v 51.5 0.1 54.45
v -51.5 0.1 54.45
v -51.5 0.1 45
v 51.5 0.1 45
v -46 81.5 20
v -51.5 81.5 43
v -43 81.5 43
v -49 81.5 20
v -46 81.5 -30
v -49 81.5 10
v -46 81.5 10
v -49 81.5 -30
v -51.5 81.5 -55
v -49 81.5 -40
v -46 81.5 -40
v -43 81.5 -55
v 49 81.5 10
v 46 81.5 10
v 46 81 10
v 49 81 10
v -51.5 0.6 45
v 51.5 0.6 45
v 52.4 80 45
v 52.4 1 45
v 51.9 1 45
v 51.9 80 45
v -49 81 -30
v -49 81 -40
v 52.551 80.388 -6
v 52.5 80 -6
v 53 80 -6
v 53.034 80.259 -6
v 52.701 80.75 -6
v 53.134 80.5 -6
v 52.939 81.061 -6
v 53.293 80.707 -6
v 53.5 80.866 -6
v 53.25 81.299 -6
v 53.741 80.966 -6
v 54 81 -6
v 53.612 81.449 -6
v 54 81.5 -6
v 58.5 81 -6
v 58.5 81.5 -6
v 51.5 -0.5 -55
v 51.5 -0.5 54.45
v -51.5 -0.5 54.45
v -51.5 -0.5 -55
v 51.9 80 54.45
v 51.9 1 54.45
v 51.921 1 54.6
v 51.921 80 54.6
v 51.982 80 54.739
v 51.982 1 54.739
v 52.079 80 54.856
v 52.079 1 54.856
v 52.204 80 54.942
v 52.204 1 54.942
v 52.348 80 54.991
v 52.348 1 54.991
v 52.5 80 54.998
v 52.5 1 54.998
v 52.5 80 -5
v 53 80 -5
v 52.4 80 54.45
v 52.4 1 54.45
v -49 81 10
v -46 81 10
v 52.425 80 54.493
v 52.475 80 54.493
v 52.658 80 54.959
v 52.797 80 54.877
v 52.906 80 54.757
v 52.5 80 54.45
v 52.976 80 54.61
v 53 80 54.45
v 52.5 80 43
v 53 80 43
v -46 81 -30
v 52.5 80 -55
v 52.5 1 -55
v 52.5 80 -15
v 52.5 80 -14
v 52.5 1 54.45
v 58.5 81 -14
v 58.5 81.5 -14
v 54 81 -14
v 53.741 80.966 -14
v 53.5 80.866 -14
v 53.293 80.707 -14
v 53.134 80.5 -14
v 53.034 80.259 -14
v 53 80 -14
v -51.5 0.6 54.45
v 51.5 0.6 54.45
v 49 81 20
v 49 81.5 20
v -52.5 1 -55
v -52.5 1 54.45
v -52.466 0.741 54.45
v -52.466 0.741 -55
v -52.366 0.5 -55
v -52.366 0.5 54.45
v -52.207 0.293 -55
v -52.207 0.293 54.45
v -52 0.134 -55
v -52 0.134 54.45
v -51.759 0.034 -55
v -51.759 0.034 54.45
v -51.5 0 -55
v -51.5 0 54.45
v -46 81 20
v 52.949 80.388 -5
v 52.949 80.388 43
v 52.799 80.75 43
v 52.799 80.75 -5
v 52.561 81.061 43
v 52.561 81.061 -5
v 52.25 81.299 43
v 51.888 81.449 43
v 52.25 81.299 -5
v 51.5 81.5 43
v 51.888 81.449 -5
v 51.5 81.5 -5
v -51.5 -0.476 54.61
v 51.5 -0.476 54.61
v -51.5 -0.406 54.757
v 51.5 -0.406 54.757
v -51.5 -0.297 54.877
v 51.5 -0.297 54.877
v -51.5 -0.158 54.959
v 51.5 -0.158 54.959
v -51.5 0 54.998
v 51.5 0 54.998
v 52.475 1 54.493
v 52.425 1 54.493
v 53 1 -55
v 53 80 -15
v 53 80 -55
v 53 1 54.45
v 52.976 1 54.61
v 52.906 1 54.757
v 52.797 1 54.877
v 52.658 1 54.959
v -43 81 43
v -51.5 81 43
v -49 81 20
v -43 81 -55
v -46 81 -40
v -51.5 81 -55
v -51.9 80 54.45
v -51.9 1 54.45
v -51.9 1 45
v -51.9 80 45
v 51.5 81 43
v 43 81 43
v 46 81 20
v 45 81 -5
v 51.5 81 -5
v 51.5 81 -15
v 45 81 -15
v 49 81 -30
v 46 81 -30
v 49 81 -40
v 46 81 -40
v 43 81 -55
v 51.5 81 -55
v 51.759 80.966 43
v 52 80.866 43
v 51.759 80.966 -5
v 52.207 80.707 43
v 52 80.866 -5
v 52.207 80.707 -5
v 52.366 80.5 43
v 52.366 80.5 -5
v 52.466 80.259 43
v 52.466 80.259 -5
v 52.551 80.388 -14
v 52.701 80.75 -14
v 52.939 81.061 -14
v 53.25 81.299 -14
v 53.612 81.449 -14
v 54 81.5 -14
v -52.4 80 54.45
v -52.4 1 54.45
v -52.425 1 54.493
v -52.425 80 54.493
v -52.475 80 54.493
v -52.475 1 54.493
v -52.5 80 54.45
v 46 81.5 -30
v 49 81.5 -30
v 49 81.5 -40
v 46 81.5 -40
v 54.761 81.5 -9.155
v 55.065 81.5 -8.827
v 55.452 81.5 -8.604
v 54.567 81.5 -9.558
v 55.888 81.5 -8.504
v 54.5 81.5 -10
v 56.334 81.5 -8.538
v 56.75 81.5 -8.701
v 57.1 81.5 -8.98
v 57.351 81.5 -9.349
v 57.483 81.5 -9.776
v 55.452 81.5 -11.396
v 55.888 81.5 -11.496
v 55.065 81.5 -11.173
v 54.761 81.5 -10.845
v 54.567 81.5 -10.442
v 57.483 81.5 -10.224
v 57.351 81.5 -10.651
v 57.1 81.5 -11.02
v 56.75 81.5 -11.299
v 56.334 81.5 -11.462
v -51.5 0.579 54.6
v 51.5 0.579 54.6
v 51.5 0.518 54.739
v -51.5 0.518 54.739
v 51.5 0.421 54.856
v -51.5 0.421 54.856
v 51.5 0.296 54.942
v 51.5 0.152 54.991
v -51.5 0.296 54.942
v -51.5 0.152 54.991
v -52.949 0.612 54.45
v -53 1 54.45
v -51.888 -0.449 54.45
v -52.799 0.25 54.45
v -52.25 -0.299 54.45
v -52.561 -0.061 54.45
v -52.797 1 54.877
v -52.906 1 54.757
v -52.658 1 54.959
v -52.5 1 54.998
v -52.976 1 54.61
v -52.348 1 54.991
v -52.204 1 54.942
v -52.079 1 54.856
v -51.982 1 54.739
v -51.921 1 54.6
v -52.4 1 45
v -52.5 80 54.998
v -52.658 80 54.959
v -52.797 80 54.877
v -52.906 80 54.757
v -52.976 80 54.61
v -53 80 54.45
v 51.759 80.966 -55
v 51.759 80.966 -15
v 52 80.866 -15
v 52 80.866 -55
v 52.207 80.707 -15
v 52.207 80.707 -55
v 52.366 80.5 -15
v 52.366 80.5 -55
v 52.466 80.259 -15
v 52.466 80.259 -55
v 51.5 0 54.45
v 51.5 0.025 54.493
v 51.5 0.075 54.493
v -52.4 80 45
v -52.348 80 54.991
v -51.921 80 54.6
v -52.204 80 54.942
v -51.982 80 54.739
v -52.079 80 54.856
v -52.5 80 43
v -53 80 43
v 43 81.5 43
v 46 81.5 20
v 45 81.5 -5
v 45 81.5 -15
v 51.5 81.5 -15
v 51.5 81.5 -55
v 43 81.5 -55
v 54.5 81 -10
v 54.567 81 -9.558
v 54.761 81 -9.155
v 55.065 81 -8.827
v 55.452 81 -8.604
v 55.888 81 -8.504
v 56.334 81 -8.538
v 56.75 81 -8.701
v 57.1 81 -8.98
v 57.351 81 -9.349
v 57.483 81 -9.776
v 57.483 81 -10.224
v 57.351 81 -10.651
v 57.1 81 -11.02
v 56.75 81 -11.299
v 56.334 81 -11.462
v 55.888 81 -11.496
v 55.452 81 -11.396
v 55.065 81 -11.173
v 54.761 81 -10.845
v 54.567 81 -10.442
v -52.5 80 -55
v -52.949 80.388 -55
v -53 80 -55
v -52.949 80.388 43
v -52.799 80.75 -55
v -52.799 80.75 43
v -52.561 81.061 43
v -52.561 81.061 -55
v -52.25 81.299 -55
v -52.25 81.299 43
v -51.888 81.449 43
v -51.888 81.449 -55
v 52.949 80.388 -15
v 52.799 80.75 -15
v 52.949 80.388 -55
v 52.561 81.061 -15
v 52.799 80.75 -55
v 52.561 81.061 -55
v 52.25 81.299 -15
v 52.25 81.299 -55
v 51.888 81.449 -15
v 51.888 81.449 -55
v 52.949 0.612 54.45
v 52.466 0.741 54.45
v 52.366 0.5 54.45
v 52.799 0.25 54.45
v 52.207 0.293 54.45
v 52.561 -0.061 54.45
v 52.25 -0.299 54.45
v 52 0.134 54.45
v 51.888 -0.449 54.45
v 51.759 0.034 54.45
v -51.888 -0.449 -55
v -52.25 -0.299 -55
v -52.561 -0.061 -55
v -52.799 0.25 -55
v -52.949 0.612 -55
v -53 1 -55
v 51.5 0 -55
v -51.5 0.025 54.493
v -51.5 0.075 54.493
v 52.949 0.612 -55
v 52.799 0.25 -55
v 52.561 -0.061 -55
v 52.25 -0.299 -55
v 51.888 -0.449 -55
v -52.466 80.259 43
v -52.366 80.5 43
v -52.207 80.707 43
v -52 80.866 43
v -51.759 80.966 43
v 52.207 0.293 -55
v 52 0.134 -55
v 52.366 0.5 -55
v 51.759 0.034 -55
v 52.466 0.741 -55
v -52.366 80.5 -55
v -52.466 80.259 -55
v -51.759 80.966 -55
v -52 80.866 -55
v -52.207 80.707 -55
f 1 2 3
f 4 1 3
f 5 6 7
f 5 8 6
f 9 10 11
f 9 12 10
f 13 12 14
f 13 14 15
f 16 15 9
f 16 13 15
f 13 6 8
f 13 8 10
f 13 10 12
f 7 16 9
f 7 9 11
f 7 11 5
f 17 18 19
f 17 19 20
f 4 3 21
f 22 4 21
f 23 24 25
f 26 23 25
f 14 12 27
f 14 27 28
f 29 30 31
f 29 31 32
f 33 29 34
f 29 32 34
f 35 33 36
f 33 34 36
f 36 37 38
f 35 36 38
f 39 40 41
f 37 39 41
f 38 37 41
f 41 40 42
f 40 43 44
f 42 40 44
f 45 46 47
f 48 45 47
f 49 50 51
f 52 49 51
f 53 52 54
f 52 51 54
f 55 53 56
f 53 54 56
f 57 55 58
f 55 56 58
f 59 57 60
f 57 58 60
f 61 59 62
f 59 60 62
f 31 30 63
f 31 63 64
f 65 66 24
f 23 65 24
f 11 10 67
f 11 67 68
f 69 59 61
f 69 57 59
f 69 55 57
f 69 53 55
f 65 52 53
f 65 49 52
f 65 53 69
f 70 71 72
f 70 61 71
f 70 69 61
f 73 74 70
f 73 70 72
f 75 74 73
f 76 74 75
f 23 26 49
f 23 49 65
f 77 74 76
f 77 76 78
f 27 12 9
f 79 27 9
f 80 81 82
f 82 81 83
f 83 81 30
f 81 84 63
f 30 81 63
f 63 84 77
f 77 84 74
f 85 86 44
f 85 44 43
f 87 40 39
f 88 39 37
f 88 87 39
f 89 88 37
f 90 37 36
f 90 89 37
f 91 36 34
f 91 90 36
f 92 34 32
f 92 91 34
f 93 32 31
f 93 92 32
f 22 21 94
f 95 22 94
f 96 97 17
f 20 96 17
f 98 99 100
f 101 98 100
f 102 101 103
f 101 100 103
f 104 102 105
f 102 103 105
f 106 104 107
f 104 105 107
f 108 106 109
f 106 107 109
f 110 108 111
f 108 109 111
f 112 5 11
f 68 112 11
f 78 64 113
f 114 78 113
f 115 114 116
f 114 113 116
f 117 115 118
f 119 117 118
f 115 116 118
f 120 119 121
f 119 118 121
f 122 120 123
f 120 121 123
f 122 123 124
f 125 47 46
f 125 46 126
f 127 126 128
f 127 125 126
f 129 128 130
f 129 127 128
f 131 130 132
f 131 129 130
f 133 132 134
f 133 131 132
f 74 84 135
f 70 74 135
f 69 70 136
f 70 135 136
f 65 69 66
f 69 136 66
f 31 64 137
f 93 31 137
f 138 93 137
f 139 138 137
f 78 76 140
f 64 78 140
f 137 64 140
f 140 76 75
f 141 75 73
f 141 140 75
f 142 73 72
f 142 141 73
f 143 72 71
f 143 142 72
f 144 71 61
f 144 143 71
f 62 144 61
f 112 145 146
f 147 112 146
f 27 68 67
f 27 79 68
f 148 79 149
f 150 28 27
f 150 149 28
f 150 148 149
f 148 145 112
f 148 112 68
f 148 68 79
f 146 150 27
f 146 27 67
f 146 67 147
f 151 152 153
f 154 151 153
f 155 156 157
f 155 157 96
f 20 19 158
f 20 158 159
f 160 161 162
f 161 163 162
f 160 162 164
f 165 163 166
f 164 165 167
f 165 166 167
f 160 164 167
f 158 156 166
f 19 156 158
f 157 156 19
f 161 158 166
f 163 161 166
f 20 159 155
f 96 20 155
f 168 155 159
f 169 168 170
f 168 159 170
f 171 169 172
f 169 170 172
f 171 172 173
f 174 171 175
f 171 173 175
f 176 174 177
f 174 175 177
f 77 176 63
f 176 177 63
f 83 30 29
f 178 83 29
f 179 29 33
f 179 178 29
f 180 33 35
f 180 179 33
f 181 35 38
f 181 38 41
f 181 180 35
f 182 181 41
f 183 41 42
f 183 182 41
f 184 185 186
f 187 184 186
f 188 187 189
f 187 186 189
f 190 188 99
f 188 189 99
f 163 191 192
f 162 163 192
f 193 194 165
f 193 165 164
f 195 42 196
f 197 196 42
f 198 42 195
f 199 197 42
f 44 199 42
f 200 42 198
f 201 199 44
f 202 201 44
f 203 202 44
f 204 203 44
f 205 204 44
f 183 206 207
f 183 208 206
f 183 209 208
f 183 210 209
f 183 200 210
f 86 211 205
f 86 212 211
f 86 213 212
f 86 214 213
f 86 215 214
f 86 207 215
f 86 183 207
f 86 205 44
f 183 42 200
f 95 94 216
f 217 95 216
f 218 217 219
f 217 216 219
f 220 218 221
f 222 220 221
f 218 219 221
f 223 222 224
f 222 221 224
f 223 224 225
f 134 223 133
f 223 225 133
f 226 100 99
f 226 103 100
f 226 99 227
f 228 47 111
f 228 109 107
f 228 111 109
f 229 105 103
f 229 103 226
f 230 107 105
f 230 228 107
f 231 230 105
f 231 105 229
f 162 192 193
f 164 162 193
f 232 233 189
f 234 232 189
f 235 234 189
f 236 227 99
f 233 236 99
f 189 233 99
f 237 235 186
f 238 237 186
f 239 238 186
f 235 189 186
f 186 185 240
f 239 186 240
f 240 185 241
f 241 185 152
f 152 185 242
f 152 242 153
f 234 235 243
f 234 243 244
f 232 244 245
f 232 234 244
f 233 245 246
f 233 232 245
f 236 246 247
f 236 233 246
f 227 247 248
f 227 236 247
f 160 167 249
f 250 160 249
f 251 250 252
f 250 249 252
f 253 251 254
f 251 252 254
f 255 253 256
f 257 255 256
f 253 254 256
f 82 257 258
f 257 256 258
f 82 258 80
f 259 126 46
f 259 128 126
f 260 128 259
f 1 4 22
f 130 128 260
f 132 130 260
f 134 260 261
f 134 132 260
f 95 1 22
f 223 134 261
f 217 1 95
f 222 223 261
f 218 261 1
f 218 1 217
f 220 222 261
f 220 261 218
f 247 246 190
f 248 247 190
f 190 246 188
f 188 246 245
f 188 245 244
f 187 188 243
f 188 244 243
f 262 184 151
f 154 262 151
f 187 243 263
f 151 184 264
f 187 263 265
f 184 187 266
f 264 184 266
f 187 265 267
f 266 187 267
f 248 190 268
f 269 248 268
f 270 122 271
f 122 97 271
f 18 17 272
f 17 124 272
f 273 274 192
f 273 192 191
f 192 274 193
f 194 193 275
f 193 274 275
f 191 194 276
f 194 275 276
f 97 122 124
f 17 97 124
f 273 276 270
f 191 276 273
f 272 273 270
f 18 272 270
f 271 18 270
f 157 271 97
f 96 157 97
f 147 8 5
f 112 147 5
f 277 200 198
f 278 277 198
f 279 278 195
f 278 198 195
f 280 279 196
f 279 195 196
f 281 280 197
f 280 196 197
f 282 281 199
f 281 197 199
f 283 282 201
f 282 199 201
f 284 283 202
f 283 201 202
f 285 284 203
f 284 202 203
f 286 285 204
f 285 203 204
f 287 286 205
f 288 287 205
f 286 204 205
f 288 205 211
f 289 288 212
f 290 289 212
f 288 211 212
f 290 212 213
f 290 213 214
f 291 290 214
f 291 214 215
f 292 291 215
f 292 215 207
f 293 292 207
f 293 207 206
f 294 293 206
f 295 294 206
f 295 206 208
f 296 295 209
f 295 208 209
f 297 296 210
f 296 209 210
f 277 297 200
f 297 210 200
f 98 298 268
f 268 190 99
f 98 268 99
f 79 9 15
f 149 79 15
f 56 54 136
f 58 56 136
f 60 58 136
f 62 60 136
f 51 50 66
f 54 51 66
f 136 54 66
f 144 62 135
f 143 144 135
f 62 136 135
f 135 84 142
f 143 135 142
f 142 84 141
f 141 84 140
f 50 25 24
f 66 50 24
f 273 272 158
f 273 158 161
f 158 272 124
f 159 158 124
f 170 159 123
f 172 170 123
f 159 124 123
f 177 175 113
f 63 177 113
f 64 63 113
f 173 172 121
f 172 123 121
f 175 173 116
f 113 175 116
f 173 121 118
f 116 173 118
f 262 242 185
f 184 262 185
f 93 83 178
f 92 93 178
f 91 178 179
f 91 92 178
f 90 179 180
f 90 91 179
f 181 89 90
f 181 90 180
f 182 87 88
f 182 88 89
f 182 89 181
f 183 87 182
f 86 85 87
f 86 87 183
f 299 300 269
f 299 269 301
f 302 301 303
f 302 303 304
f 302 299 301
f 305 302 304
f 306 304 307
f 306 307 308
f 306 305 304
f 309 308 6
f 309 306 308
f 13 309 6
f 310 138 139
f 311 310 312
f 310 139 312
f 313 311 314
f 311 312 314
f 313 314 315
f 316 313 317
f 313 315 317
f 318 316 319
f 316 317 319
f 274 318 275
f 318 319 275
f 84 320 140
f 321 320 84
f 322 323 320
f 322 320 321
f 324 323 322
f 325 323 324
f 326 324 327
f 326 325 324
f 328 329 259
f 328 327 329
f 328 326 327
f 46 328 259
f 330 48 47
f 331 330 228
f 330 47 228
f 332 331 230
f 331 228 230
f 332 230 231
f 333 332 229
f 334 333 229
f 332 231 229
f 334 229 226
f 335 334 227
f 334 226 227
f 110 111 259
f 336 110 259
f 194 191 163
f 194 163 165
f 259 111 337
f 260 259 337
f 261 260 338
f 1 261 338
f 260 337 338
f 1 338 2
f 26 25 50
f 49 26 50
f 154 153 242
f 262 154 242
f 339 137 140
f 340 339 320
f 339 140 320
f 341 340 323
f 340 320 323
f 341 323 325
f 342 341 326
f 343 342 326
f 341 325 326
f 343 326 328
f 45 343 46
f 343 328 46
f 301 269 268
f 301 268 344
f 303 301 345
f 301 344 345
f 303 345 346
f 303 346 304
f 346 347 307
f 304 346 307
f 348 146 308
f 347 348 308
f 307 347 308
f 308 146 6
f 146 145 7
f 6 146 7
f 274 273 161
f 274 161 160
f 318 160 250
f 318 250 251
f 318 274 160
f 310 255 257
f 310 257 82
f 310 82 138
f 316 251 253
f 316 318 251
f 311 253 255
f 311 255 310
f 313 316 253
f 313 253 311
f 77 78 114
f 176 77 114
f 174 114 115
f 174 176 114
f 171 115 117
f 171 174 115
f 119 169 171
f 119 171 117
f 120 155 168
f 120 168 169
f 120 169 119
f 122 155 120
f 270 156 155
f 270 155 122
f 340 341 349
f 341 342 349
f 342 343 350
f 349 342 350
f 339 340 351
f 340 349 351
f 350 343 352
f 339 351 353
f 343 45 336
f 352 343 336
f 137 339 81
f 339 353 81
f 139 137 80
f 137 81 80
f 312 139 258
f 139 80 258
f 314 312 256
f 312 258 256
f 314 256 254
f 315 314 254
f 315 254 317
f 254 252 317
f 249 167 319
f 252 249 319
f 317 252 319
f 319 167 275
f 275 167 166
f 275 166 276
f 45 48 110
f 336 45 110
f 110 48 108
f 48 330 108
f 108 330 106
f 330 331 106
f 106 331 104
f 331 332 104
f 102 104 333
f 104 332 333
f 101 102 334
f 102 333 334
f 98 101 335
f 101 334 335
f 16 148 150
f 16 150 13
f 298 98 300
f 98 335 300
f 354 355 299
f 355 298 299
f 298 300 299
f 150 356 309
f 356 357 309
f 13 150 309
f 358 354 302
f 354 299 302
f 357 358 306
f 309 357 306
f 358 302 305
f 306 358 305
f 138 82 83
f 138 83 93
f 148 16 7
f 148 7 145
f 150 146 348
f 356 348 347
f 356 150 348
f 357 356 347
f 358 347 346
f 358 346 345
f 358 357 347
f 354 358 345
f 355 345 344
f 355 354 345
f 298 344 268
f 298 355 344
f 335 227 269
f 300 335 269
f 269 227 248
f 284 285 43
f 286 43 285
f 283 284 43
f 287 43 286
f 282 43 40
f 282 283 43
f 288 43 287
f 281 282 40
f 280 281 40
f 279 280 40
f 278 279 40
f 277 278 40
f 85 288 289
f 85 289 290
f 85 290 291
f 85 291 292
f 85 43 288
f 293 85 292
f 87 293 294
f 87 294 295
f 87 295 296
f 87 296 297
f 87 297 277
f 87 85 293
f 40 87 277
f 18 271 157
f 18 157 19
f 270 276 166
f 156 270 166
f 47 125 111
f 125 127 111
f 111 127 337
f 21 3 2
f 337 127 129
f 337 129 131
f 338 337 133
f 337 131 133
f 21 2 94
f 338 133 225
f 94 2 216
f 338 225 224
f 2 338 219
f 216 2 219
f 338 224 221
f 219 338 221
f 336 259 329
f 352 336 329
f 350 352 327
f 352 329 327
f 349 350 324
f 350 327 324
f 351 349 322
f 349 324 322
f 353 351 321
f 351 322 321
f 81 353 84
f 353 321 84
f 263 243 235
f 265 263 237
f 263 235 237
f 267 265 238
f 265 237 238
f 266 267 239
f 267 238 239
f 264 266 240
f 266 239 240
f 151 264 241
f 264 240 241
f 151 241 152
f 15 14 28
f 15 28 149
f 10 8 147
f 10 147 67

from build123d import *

# Parameters (mm, degrees)
SM_BASE_FLANGE_1_DEPTH = 55
OTHER_START            = -1
OTHER_1_DEPTH          = 2
OTHER_START_2          = 1
OTHER_1_2_DEPTH        = 79
OTHER_START_3          = -0.24719
OTHER_1_3_DEPTH        = 81.24719
OTHER_START_4          = -51.5
OTHER_1_4_DEPTH        = 103
OTHER_1_5_DEPTH        = 103
SM_EDGE_FLANGE_1_DEPTH = 98
SKETCH_19_W            = 10
SKETCH_19_H            = 10
CUT_EXTRUDE_1_DEPTH    = 1.5
SM_EDGE_FLANGE_2_DEPTH = 8
SKETCH_24_R            = 1.5
CUT_EXTRUDE_2_DEPTH    = 0.5
SKETCH_27_W            = 3
SKETCH_27_H            = 10
CUT_EXTRUDE_3_DEPTH    = 0.5


with BuildPart() as part:
    # 基体-法兰1: sheet metal written as solids
    # Sketch 1 → 基体-法兰1 (new, symmetric)
    with BuildSketch(Plane.XY):
        with BuildLine():
            Line((-52.5, 80), (-52.5, 1))
            ThreePointArc((-52.5, 1), (-52.207106781, 0.292893219), (-51.5, 0))
            Line((-51.5, 0), (51.5, 0))
            ThreePointArc((51.5, 0), (52.207106781, 0.292893219), (52.5, 1))
            Line((52.5, 1), (52.5, 80))
            Line((52.5, 80), (53, 80))
            Line((53, 80), (53, 1))
            ThreePointArc((53, 1), (52.560660172, -0.060660172), (51.5, -0.5))
            Line((51.5, -0.5), (-51.5, -0.5))
            ThreePointArc((-51.5, -0.5), (-52.560660172, -0.060660172), (-53, 1))
            Line((-53, 1), (-53, 80))
            Line((-53, 80), (-52.5, 80))
        make_face()
    extrude(amount=SM_BASE_FLANGE_1_DEPTH, both=True)

    # Other 1: read off the stored shape, not the designer's step
    # Other 1 outline → Other 1 (cut)
    with BuildSketch(Plane(origin=(0, 0, 0), x_dir=(1, 0, 0), z_dir=(0, 1, 0)).offset(OTHER_START)):
        with BuildLine():
            Line((51.5, -54.45), (51.5, -55))
            Line((51.5, -55), (52.45, -55))
            ThreePointArc((52.45, -55), (52.83890873, -54.83890873), (53, -54.45))
            Line((53, -54.45), (51.5, -54.45))
        make_face()
        with BuildLine():
            Line((-52.45, -55), (-51.5, -55))
            Line((-51.5, -55), (-51.5, -54.45))
            Line((-51.5, -54.45), (-53, -54.45))
            ThreePointArc((-53, -54.45), (-52.83890873, -54.83890873), (-52.45, -55))
        make_face()
    extrude(amount=OTHER_1_DEPTH, mode=Mode.SUBTRACT)

    # Other 1 2 outline → Other 1 2 (add)
    with BuildSketch(Plane(origin=(0, 0, 0), x_dir=(1, 0, 0), z_dir=(0, 1, 0)).offset(OTHER_START_2)):
        with BuildLine():
            Line((51.9, -45), (51.9, -54.45))
            ThreePointArc((51.9, -54.45), (52.45, -55), (53, -54.45))
            Line((53, -54.45), (52.5, -54.45))
            ThreePointArc((52.5, -54.45), (52.45, -54.5), (52.4, -54.45))
            Line((52.4, -54.45), (52.4, -45))
            Line((52.4, -45), (51.9, -45))
        make_face()
        with BuildLine():
            ThreePointArc((-53, -54.45), (-52.45, -55), (-51.9, -54.45))
            Line((-51.9, -54.45), (-51.9, -45))
            Line((-51.9, -45), (-52.4, -45))
            Line((-52.4, -45), (-52.4, -54.45))
            ThreePointArc((-52.4, -54.45), (-52.45, -54.5), (-52.5, -54.45))
            Line((-52.5, -54.45), (-53, -54.45))
        make_face()
    extrude(amount=OTHER_1_2_DEPTH)

    # Other 1 3 outline → Other 1 3 (cut)
    with BuildSketch(Plane(origin=(0, 0, 0), x_dir=(1, 0, 0), z_dir=(0, 1, 0)).offset(OTHER_START_3)):
        with BuildLine():
            ThreePointArc((-52.45, -55), (-52.83890873, -54.83890873), (-53, -54.45))
            Line((-53, -54.45), (-53, -55))
            Line((-53, -55), (-52.45, -55))
        make_face()
        with BuildLine():
            Line((52.45, -55), (53, -55))
            Line((53, -55), (53, -54.45))
            ThreePointArc((53, -54.45), (52.83890873, -54.83890873), (52.45, -55))
        make_face()
    extrude(amount=OTHER_1_3_DEPTH, mode=Mode.SUBTRACT)

    # Other 1 4 outline → Other 1 4 (cut)
    with BuildSketch(Plane.YZ.offset(OTHER_START_4)):
        with BuildLine():
            ThreePointArc((-0.5, 54.45), (-0.35620192, 54.820809924), (0, 54.997722558))
            Line((0, 54.997722558), (0, 55))
            Line((0, 55), (-0.5, 55))
            Line((-0.5, 55), (-0.5, 54.45))
        make_face()
    extrude(amount=OTHER_1_4_DEPTH, mode=Mode.SUBTRACT)

    # Other 1 5 outline → Other 1 5 (add)
    with BuildSketch(Plane.YZ.offset(OTHER_START_4)):
        with BuildLine():
            Line((0.1, 45), (0.6, 45))
            Line((0.6, 45), (0.6, 54.45))
            ThreePointArc((0.6, 54.45), (0.420809924, 54.85620192), (0, 54.997722558))
            Line((0, 54.997722558), (0, 54.45))
            ThreePointArc((0, 54.45), (0.05, 54.5), (0.1, 54.45))
            Line((0.1, 54.45), (0.1, 45))
        make_face()
    extrude(amount=OTHER_1_5_DEPTH)

    # 边线-法兰1: sheet metal written as solids
    # 边线-法兰1 section (on a plane across the edge) → 边线-法兰1 (add)
    with BuildSketch(Plane(origin=(-52.5, 81, -55), x_dir=(0, -1, 0), z_dir=(0, 0, 1))):
        with BuildLine():
            Line((-0.5, 1), (-0.5, 9.5))
            Line((-0.5, 9.5), (0, 9.5))
            Line((0, 9.5), (0, 1))
            ThreePointArc((0, 1), (0.292893219, 0.292893219), (1, 0))
            Line((1, 0), (1, -0.5))
            ThreePointArc((1, -0.5), (-0.060660172, -0.060660172), (-0.5, 1))
        make_face()
    sm_edge_flange_1 = extrude(amount=SM_EDGE_FLANGE_1_DEPTH)

    # 镜向1: 边线-法兰1 across plane
    add(sm_edge_flange_1.mirror(Plane(origin=(0, 0, 0), x_dir=(0, 0, 1), z_dir=(1, 0, 0))))

    # 草图19 → 切除-拉伸1 (cut)
    with BuildSketch(Plane(origin=(0, 81.5, 0), x_dir=(1, 0, 0), z_dir=(0, 1, 0))):
        with Locations((50, 10)):
            Rectangle(SKETCH_19_W, SKETCH_19_H)
    extrude(amount=-CUT_EXTRUDE_1_DEPTH, mode=Mode.SUBTRACT)

    # 边线-法兰2: sheet metal written as solids
    # 边线-法兰2 section (on a plane across the edge) → 边线-法兰2 (add)
    with BuildSketch(Plane(origin=(53, 81, -14), x_dir=(0, -1, 0), z_dir=(0, 0, 1))):
        with BuildLine():
            Line((-0.5, 1), (-0.5, 5.5))
            Line((-0.5, 5.5), (0, 5.5))
            Line((0, 5.5), (0, 1))
            ThreePointArc((0, 1), (0.292893219, 0.292893219), (1, 0))
            Line((1, 0), (1, -0.5))
            ThreePointArc((1, -0.5), (-0.060660172, -0.060660172), (-0.5, 1))
        make_face()
    extrude(amount=SM_EDGE_FLANGE_2_DEPTH)

    # 草图24 → 切除-拉伸2 (cut)
    with BuildSketch(Plane(origin=(0, 81.5, 0), x_dir=(1, 0, 0), z_dir=(0, 1, 0))):
        with Locations(Location((56, 10, 0), (0, 0, 180))):
            Circle(SKETCH_24_R)
    extrude(amount=-CUT_EXTRUDE_2_DEPTH, mode=Mode.SUBTRACT)

    # 草图27 → 切除-拉伸3 (cut)
    with BuildSketch(Plane(origin=(0, 81.5, 0), x_dir=(1, 0, 0), z_dir=(0, 1, 0))):
        with Locations((47.5, 35)):
            Rectangle(SKETCH_27_W, SKETCH_27_H)
        with Locations((47.5, -15)):
            Rectangle(SKETCH_27_W, SKETCH_27_H)
        with Locations((-47.5, 35)):
            Rectangle(SKETCH_27_W, SKETCH_27_H)
        with Locations((-47.5, -15)):
            Rectangle(SKETCH_27_W, SKETCH_27_H)
    extrude(amount=-CUT_EXTRUDE_3_DEPTH, mode=Mode.SUBTRACT)


solid = part.part
